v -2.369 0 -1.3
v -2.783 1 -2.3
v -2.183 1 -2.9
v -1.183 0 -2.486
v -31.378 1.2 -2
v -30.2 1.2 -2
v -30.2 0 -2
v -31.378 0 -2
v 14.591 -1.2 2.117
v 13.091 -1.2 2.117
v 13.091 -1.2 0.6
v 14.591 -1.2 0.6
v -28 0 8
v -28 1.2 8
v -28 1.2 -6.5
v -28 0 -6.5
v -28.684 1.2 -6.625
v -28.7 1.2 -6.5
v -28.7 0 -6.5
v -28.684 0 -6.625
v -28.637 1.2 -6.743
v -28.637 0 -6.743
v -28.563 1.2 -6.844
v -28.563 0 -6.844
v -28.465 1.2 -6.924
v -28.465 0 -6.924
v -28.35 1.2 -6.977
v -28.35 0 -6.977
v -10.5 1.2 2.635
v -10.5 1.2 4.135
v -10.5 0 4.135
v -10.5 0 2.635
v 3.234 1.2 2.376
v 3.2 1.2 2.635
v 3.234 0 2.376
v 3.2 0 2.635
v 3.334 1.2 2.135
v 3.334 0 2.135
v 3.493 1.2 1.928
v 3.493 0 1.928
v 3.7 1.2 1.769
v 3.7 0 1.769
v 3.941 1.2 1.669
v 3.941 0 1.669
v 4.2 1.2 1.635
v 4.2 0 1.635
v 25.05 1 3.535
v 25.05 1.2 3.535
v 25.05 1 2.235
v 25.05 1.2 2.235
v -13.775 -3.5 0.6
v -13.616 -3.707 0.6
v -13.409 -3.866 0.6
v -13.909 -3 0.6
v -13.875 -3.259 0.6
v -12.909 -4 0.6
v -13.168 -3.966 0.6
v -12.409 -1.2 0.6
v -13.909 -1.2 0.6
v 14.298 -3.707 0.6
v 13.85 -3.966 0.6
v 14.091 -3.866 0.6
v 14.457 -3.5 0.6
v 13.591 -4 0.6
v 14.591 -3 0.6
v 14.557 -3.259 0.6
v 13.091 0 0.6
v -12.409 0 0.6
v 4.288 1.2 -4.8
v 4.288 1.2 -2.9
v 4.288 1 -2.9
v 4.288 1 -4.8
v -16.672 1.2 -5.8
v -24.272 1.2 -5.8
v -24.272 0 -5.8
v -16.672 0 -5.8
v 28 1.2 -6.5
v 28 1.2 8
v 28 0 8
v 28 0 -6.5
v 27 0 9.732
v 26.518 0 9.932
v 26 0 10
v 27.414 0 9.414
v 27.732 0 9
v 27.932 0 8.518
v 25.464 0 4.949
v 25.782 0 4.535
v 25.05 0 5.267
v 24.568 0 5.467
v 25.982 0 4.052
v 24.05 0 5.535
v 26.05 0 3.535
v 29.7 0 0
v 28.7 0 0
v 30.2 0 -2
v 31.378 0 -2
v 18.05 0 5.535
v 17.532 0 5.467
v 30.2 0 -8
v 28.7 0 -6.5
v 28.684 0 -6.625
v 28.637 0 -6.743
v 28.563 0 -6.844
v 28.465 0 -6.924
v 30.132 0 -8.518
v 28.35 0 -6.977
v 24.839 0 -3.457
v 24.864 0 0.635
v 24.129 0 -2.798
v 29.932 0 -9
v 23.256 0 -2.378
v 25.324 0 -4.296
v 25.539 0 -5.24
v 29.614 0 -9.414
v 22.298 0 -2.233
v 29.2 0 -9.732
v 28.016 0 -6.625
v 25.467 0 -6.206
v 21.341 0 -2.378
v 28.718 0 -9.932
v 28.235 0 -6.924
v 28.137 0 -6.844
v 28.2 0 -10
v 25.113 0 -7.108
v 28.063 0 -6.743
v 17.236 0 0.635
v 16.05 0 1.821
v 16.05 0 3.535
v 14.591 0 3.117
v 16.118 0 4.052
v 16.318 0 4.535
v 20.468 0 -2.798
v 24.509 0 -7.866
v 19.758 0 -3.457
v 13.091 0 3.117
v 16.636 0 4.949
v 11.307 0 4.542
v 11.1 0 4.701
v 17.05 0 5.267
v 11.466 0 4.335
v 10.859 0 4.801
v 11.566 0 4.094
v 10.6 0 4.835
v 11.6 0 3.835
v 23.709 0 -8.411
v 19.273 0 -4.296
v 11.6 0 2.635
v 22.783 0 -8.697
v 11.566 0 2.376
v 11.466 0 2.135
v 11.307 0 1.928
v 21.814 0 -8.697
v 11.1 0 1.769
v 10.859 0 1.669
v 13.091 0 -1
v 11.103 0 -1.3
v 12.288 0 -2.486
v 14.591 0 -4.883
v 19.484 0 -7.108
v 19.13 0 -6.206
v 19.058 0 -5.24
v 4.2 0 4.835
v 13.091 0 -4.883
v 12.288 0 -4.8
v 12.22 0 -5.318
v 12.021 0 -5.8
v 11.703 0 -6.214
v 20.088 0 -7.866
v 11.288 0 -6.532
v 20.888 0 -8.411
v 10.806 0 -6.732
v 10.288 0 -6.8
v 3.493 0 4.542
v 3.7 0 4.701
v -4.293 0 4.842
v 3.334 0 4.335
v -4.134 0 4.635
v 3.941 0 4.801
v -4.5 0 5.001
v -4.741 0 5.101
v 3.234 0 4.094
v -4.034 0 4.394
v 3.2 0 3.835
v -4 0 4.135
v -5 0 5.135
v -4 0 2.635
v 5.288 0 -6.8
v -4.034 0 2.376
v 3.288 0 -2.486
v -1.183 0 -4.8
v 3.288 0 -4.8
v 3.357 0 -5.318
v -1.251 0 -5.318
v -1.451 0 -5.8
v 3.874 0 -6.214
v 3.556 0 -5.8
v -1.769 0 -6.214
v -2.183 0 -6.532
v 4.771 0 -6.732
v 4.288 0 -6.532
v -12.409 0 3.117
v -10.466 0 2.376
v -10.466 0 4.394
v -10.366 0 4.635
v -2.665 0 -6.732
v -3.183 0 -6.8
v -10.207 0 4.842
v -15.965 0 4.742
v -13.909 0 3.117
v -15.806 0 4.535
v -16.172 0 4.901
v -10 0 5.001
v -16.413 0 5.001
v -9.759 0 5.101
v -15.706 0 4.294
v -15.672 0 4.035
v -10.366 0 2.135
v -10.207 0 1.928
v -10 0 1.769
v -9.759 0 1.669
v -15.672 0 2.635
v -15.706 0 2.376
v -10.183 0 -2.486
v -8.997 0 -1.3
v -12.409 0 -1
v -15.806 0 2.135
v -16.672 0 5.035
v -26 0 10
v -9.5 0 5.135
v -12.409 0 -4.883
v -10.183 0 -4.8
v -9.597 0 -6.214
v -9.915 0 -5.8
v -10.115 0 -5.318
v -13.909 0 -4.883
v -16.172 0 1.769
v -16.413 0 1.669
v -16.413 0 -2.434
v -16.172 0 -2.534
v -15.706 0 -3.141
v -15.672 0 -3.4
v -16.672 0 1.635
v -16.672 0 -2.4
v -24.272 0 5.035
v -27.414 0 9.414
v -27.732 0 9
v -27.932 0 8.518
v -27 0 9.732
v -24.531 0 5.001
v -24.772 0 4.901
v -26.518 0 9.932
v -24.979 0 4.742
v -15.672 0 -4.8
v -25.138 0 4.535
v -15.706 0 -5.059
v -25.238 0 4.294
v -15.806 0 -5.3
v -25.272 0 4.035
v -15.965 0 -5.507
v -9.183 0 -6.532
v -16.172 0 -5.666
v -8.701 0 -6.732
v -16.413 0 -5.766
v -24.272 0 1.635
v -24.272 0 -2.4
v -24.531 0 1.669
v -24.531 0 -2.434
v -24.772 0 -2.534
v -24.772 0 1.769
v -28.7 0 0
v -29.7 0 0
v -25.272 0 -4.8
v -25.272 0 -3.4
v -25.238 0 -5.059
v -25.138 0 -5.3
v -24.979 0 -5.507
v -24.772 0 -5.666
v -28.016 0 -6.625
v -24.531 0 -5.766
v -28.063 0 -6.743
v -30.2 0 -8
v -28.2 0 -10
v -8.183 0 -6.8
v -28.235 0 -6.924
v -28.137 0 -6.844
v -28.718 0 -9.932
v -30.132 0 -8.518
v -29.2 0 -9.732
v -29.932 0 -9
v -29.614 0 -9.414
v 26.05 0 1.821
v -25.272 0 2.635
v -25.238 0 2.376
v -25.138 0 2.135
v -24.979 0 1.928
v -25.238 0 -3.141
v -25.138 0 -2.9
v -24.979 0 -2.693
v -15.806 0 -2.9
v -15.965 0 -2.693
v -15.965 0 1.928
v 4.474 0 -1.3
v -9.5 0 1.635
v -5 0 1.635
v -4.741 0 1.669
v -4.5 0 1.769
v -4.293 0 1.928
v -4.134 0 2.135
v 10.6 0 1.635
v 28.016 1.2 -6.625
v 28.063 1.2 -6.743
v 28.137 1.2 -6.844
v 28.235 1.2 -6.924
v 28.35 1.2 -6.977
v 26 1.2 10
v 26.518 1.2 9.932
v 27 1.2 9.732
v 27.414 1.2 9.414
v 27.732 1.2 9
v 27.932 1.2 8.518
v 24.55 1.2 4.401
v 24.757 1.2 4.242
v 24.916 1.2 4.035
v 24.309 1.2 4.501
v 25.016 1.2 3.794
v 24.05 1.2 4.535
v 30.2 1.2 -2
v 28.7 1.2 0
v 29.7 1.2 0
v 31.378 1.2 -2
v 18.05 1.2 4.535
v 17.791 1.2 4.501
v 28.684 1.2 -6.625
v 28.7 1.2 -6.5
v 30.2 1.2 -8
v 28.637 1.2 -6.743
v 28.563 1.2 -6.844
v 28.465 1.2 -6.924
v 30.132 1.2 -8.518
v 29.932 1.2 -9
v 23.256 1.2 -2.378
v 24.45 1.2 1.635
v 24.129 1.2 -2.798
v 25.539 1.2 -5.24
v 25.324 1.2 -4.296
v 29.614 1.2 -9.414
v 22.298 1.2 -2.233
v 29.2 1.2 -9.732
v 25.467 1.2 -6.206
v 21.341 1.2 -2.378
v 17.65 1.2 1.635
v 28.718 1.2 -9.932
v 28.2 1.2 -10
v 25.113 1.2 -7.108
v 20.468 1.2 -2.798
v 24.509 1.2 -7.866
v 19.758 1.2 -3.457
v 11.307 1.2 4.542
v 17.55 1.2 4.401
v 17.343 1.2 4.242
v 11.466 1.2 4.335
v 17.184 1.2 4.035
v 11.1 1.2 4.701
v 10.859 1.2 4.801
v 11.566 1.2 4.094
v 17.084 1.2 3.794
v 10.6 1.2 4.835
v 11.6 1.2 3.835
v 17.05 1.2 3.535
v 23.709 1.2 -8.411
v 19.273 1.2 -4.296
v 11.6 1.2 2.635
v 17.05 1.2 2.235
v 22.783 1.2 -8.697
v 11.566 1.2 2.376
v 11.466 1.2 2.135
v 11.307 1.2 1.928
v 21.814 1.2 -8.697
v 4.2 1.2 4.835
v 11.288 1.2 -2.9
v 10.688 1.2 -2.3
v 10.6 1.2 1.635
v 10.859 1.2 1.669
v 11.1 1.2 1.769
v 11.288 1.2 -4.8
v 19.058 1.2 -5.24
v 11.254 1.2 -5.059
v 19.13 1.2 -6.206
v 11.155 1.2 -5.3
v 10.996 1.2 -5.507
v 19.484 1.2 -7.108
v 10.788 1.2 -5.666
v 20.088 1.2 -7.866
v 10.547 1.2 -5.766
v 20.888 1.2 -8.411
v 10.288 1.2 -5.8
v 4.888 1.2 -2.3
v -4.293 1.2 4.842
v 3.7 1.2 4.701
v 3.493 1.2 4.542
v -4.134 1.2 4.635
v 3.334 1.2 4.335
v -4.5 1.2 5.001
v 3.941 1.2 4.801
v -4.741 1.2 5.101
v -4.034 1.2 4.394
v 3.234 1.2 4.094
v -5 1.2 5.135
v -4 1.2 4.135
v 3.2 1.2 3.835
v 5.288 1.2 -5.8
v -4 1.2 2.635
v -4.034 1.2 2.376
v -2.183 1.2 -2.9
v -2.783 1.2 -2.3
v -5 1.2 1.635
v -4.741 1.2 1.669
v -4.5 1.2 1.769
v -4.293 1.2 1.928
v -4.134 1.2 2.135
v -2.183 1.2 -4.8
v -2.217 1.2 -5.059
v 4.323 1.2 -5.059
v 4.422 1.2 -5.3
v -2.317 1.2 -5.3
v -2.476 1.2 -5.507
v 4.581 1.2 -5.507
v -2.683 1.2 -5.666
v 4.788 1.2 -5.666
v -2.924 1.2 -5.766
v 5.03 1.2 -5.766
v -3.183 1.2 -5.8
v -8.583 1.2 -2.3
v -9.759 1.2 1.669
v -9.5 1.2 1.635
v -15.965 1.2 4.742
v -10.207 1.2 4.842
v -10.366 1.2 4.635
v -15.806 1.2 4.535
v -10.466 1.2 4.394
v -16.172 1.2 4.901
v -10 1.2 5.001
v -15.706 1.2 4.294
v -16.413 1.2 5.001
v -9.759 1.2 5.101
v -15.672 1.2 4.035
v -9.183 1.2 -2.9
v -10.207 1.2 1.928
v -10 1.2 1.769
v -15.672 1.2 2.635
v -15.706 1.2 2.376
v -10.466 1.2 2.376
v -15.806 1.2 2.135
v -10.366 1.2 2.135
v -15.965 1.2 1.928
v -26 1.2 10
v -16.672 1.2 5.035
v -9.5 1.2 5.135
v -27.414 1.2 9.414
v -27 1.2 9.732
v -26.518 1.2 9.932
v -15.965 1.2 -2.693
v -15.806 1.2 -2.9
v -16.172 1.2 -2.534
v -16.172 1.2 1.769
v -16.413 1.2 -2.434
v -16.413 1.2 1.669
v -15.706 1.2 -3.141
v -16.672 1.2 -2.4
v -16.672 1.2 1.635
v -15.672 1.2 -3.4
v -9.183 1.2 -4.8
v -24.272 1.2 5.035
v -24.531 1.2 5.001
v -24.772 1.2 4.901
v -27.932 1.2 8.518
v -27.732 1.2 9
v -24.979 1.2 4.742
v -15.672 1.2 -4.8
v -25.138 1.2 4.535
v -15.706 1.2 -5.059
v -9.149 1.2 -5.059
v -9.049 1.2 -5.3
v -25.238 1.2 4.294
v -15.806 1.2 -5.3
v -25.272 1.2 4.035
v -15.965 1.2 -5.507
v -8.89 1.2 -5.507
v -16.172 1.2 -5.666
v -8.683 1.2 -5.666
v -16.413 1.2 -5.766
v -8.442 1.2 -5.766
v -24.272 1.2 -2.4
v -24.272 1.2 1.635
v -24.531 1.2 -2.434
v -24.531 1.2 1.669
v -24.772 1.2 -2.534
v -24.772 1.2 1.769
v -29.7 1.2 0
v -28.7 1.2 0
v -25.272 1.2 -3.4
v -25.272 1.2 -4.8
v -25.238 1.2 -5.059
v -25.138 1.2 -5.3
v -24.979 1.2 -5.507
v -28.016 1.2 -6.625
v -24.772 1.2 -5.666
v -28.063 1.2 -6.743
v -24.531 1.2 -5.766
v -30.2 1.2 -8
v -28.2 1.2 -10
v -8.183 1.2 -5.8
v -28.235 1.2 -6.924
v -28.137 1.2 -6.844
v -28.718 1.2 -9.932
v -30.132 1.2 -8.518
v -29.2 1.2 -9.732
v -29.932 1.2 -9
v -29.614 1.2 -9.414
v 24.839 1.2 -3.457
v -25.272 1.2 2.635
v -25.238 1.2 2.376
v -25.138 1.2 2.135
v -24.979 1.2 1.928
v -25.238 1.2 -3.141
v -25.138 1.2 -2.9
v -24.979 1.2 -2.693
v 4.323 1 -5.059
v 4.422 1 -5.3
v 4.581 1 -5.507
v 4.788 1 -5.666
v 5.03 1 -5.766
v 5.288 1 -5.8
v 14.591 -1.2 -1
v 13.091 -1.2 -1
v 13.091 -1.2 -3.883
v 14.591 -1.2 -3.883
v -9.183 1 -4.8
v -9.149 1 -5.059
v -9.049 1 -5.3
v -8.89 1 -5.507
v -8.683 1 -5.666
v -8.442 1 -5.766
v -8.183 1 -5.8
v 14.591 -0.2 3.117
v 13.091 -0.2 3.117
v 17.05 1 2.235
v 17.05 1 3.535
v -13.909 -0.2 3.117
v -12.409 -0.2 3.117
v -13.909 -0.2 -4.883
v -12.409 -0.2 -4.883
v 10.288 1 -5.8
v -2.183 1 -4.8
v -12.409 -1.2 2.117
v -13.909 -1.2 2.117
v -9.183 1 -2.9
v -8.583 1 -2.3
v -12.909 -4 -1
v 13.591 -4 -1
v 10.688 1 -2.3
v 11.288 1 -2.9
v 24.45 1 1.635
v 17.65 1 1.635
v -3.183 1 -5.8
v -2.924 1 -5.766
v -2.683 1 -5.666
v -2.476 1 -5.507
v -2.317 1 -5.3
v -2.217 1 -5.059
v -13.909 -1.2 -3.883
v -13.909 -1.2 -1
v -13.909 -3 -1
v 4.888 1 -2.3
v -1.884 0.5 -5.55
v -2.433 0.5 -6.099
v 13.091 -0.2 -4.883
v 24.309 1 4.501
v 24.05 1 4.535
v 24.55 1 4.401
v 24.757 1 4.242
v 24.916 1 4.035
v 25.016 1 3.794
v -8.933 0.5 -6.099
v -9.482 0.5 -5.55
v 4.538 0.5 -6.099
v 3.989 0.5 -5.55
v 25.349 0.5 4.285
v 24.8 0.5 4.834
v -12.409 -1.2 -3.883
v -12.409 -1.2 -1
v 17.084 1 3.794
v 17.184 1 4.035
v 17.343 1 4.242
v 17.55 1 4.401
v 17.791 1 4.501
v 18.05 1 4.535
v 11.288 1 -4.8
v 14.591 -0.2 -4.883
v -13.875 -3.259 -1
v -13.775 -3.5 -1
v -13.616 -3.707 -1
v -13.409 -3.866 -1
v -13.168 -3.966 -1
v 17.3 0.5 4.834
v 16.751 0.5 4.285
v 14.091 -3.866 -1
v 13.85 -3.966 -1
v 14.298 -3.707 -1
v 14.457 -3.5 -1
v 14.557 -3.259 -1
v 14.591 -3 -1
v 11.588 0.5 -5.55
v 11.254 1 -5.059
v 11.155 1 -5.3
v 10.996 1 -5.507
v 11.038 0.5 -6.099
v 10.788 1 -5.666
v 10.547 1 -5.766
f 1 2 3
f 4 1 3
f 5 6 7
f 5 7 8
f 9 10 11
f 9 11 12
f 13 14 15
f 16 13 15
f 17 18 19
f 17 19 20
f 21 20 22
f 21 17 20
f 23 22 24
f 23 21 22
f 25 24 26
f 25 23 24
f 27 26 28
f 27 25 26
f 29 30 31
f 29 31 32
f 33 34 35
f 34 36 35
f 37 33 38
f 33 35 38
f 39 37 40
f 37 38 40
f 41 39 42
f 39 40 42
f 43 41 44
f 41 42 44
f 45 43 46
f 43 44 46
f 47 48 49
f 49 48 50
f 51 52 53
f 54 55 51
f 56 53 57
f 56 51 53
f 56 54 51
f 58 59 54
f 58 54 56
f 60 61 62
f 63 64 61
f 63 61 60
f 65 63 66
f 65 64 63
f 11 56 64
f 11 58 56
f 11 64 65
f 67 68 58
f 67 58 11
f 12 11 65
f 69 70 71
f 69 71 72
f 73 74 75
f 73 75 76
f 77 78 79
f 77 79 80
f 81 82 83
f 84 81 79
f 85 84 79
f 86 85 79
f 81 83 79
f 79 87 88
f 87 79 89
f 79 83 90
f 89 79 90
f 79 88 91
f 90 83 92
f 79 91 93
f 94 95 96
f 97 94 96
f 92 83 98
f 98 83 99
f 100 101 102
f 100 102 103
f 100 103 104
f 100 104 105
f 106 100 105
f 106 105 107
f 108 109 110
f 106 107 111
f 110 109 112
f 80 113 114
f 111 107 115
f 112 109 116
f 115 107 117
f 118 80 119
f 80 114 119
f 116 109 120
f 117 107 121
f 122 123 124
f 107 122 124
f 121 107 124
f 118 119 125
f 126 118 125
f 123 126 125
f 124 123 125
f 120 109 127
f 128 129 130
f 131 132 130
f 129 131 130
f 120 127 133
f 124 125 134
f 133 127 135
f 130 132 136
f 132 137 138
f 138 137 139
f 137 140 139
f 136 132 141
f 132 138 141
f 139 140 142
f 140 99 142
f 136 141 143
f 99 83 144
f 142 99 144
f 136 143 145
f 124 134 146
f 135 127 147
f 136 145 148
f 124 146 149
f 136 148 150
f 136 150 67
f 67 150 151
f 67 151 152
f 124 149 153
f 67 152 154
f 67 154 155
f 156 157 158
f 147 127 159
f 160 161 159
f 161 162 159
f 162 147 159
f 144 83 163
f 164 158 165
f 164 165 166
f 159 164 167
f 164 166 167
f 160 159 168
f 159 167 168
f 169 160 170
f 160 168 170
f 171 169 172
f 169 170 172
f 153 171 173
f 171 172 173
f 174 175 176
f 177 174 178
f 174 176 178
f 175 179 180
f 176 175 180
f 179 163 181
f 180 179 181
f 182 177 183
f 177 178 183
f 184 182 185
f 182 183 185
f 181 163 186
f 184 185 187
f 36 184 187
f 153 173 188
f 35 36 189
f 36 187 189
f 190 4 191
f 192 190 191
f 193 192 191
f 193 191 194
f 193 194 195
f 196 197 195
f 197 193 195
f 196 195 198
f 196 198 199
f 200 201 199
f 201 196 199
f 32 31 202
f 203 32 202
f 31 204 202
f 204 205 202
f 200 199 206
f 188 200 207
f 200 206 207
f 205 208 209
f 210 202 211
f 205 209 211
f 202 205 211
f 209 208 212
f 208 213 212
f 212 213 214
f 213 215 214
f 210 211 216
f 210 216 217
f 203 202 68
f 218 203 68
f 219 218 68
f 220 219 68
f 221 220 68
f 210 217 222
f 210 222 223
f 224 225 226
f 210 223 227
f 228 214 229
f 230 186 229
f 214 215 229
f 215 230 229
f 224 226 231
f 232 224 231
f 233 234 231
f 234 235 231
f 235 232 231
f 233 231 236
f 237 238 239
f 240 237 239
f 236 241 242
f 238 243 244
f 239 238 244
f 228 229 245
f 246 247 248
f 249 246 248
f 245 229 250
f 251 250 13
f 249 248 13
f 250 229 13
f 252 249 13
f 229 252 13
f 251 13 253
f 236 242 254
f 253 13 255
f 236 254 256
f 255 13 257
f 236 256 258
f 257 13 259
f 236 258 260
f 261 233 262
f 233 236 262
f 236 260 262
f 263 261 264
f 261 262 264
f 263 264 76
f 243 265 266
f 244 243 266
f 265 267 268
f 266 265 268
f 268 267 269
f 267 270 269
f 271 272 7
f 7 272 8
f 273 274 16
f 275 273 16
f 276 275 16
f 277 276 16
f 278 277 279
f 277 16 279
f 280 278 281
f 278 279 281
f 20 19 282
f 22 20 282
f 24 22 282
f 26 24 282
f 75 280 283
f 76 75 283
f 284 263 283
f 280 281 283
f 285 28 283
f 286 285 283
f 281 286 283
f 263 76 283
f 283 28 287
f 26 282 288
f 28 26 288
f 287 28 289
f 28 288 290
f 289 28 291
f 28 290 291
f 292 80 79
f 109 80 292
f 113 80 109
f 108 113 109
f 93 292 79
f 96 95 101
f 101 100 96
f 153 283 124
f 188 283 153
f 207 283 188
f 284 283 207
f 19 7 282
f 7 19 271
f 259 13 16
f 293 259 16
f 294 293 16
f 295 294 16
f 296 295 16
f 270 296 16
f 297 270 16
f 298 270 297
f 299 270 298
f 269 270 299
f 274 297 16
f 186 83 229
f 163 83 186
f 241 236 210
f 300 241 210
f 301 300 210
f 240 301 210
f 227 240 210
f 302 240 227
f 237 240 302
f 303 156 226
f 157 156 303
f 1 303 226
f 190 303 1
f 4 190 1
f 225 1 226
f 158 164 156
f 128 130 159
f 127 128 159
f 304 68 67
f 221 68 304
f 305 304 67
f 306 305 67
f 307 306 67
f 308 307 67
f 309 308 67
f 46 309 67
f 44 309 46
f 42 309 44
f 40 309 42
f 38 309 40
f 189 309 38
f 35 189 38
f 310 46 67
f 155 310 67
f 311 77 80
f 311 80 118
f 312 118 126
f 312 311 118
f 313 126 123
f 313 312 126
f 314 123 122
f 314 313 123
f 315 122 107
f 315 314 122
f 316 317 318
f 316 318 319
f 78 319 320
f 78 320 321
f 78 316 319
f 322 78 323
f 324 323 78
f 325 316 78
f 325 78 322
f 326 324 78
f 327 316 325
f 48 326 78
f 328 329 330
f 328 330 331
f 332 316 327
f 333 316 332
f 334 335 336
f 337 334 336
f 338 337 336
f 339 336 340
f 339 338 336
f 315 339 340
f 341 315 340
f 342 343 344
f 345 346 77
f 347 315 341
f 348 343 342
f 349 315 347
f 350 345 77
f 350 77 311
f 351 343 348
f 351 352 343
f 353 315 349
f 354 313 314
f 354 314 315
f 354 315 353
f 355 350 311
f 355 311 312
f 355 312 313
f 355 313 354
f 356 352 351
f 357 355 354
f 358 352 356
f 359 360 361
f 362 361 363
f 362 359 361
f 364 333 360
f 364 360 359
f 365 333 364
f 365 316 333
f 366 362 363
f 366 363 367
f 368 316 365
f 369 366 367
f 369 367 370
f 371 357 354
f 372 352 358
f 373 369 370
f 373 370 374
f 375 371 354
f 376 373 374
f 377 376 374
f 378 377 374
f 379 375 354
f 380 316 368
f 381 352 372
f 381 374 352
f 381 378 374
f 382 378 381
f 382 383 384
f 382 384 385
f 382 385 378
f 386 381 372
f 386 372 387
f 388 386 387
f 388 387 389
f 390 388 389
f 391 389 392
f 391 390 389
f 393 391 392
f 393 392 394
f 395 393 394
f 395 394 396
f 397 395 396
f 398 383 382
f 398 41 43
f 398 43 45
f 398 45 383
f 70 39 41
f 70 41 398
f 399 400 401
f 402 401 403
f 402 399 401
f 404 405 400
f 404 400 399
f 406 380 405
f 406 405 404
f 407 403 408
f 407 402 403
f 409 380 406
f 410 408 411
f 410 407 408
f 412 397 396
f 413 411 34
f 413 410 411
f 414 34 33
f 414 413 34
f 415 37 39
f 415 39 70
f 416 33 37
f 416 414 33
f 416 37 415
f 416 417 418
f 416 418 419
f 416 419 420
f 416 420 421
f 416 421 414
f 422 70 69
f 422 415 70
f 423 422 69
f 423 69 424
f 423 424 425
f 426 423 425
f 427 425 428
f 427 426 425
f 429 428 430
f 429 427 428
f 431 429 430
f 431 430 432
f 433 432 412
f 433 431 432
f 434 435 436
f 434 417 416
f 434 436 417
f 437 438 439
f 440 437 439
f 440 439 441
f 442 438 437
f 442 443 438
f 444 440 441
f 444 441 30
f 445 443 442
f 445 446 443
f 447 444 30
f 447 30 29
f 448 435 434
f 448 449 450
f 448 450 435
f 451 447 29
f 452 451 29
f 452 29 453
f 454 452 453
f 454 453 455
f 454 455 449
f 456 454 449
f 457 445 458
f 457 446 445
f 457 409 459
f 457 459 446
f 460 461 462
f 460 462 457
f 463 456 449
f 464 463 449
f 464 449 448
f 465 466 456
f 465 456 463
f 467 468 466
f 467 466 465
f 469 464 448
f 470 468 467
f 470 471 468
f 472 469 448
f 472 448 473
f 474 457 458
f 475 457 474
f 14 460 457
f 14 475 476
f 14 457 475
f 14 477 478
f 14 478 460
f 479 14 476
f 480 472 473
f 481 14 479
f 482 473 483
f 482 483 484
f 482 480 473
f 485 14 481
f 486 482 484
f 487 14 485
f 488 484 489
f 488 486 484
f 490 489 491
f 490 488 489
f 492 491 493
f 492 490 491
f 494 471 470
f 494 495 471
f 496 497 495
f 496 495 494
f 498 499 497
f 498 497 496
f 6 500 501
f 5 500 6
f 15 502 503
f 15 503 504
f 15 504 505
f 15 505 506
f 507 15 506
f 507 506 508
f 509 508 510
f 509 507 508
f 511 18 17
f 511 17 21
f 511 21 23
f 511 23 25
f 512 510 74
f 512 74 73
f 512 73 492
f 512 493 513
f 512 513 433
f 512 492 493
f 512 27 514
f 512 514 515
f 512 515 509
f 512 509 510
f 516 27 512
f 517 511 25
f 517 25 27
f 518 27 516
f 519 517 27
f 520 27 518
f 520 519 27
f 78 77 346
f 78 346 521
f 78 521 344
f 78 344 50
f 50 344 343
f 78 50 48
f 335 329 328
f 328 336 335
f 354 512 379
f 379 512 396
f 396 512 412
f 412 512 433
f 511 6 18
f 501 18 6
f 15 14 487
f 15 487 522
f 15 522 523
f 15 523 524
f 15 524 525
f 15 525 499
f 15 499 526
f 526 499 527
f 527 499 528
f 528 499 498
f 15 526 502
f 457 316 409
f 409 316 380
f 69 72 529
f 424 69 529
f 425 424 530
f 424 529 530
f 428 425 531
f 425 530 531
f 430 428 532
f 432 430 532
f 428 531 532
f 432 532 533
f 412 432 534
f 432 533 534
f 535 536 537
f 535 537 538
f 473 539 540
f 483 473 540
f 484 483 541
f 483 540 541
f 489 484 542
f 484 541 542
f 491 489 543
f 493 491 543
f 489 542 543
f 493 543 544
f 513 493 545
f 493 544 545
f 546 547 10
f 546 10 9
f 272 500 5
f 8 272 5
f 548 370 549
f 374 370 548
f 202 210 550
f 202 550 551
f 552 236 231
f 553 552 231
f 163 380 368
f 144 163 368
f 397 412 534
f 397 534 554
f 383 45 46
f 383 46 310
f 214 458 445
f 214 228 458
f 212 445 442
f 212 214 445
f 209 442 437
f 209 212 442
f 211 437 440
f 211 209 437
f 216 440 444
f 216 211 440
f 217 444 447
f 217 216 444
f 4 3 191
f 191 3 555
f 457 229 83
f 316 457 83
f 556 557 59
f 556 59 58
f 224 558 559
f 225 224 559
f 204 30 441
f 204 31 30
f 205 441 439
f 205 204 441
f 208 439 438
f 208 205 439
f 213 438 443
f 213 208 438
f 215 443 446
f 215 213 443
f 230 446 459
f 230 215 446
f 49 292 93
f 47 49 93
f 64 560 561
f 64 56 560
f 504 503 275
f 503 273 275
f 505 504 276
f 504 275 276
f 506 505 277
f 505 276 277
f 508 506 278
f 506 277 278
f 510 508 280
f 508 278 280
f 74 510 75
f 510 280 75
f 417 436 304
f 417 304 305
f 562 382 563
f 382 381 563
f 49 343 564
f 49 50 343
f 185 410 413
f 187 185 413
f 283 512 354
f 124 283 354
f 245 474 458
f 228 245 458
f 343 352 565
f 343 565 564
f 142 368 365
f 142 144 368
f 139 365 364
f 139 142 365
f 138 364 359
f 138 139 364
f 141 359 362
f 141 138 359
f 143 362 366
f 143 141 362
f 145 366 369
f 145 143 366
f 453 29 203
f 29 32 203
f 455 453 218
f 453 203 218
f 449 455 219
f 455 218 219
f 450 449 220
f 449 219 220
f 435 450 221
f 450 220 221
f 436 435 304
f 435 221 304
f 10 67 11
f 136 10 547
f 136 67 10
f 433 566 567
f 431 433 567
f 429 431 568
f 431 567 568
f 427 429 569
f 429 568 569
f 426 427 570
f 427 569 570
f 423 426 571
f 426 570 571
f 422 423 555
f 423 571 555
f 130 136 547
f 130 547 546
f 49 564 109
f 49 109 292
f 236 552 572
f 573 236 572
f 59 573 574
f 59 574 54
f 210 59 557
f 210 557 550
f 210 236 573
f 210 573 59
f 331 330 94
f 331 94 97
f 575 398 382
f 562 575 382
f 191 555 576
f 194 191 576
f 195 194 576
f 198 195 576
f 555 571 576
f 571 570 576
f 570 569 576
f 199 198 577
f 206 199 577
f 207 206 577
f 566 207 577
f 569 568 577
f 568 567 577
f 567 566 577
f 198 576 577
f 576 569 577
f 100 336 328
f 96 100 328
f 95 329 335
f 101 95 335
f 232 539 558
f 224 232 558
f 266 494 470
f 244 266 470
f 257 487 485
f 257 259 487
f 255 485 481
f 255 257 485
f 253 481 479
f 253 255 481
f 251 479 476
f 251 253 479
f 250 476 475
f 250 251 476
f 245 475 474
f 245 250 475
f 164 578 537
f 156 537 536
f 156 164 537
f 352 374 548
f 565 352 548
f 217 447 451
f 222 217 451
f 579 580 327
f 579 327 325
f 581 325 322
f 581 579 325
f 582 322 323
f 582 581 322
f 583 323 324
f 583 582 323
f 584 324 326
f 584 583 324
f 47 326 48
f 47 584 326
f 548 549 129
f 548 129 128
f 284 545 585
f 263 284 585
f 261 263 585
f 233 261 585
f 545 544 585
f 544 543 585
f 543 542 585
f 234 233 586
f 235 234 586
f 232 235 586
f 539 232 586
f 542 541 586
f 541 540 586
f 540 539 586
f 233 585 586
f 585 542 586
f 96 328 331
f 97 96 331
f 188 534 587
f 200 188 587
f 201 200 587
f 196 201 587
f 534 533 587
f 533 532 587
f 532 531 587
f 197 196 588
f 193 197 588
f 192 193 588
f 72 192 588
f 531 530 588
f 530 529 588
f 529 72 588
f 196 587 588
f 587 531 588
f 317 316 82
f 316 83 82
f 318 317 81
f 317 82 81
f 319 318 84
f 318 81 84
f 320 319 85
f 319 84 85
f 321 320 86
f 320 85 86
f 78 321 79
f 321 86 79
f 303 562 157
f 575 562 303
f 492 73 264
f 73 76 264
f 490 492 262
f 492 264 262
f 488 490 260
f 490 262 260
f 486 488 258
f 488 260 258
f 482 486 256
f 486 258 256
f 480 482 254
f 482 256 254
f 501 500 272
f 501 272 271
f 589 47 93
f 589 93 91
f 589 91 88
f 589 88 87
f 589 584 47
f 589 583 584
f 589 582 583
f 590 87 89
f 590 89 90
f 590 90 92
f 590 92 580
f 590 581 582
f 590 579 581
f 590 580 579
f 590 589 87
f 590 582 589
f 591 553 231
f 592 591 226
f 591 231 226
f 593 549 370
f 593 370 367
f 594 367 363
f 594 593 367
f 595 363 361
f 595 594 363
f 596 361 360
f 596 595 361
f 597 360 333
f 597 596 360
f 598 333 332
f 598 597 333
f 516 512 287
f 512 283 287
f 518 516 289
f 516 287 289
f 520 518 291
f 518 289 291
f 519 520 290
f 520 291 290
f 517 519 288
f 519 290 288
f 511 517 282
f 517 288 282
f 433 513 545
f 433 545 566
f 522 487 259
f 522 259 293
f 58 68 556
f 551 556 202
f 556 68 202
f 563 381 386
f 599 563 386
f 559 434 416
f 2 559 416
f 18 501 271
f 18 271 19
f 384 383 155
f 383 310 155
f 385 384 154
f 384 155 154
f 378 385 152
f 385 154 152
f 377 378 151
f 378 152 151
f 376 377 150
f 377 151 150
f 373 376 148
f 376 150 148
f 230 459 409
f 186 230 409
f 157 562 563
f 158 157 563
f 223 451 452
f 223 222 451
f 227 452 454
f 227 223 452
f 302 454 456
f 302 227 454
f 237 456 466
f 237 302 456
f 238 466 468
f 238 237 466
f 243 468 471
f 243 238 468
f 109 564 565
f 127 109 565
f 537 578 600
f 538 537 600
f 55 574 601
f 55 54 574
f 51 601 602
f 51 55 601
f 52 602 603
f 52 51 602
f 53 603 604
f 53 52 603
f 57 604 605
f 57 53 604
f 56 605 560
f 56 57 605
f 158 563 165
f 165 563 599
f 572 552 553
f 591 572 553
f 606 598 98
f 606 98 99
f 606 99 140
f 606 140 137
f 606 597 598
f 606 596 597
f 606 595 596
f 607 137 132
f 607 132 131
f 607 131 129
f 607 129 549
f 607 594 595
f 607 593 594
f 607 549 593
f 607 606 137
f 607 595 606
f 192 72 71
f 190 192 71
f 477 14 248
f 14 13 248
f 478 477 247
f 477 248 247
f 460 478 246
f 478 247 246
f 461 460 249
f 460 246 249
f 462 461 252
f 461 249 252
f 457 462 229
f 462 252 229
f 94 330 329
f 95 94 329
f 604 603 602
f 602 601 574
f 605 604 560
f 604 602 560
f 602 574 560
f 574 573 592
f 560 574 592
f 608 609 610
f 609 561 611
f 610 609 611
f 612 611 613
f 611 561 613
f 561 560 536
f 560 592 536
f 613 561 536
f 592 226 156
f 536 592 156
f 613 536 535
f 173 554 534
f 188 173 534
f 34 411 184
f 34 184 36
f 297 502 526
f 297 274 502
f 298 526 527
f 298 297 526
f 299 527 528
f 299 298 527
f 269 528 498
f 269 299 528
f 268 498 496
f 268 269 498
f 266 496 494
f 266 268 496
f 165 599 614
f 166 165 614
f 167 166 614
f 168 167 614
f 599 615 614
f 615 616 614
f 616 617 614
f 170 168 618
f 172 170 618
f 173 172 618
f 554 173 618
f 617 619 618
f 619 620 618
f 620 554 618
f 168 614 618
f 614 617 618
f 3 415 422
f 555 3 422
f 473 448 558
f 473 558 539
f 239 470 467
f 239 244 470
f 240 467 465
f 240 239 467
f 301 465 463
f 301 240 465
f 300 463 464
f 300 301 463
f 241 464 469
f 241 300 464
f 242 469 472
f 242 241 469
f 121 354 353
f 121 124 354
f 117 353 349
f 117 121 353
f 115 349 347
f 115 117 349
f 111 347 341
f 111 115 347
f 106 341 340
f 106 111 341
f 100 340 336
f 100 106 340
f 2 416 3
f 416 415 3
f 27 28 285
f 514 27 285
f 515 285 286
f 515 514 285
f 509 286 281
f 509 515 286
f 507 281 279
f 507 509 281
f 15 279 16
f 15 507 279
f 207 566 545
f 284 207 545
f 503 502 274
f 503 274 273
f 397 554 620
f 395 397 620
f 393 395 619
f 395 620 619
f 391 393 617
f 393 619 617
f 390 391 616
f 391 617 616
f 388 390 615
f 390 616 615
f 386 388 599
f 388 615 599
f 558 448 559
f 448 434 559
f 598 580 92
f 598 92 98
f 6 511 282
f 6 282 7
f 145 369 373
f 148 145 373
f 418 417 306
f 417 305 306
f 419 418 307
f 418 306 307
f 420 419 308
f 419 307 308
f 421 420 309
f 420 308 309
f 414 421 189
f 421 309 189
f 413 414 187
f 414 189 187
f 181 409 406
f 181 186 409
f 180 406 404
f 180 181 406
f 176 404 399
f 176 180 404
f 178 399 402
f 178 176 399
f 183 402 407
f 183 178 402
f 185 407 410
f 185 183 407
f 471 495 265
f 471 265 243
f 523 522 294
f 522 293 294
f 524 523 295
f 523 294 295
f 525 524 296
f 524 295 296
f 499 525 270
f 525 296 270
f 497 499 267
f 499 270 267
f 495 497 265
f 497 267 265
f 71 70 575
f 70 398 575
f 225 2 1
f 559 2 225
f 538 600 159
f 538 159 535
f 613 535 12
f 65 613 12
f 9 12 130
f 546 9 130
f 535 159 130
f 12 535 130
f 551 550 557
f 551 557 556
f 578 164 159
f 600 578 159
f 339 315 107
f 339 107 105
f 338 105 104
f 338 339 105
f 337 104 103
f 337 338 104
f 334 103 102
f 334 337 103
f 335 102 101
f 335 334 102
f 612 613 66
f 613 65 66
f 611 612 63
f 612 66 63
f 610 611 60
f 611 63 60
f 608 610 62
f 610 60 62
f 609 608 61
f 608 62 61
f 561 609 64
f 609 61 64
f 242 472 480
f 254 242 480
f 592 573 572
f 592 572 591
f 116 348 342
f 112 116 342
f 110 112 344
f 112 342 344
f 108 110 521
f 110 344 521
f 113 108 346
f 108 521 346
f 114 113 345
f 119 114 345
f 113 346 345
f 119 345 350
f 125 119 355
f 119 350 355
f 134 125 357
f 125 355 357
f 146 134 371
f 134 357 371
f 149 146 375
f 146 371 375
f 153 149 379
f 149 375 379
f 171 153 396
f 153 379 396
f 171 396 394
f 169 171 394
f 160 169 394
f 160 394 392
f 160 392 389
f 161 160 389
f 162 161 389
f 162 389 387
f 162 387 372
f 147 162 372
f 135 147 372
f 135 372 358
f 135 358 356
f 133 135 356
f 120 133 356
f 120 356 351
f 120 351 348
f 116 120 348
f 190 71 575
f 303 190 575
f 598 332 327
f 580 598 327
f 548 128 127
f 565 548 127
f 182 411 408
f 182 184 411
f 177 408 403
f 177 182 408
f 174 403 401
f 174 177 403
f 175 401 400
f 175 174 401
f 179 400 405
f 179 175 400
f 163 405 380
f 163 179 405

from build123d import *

# Parameters (mm, degrees)
SKETCH_1_W          = 60
SKETCH_1_H          = 20
EXTRUDE_1_DEPTH     = 1.2
CUT_EXTRUDE_1_REACH = 33.646
SKETCH_4_R          = 3.25
SKETCH_4_W          = 9.6
SKETCH_4_H          = 3.4
SKETCH_4_W_2        = 7
SKETCH_4_H_2        = 3.5
SKETCH_4_W_3        = 8
SKETCH_4_H_3        = 2.9
SKETCH_4_W_4        = 8.4
SKETCH_4_H_4        = 3.2
SKETCH_4_W_5        = 6.5
FILLET_2_R          = 1
CHAMFER_1_SIZE      = 0.6
SKETCH_5_W          = 1.5
SKETCH_5_H          = 8
EXTRUDE_2_DEPTH     = 1.2
SKETCH_6_W          = 28.5
SKETCH_6_H          = 1.6
EXTRUDE_3_DEPTH     = 4
FILLET_3_R          = 1
CHAMFER_2_SIZE      = 1
CHAMFER_4_SIZE      = 1
SKETCH_7_W          = 2
SKETCH_7_H          = 20
CUT_EXTRUDE_2_DEPTH = 5
EXTRUDE_5_DEPTH     = 1.2
FILLET_5_R          = 2
FILLET_6_R          = 0.5
CHAMFER_5_SIZE      = 2
CHAMFER_5_SIZE_2    = 2.383507185
CHAMFER_6_SIZE      = 2
CHAMFER_6_SIZE_2    = 2.383507185


with BuildPart() as part:
    # 草图1 → 凸台-拉伸1 (new body)
    with BuildSketch(Plane(origin=(0, 0, 0), x_dir=(1, 0, 0), z_dir=(0, 1, 0))):
        Rectangle(SKETCH_1_W, SKETCH_1_H)
    extrude(amount=EXTRUDE_1_DEPTH)

    # 草图4 → 切除-拉伸1 (cut, up to next)
    with BuildSketch(Plane(origin=(0, 1.2, 0), x_dir=(1, 0, 0), z_dir=(0, 1, 0)), mode=Mode.PRIVATE) as cut_extrude_1_sk1:
        with Locations(Location((22.298485985, 5.48318929, 0), (0, 0, 270))):
            Circle(SKETCH_4_R)
    cut_extrude_1_tool1 = extrude(cut_extrude_1_sk1.sketch, amount=-CUT_EXTRUDE_1_REACH, mode=Mode.PRIVATE) & part.part
    # 草图4 → 切除-拉伸1 (cut, up to next)
    with BuildSketch(Plane(origin=(0, 1.2, 0), x_dir=(1, 0, 0), z_dir=(0, 1, 0)), mode=Mode.PRIVATE) as cut_extrude_1_sk2:
        with Locations((-20.471722325, 4.1)):
            Rectangle(SKETCH_4_W, SKETCH_4_H)
    cut_extrude_1_tool2 = extrude(cut_extrude_1_sk2.sketch, amount=-CUT_EXTRUDE_1_REACH, mode=Mode.PRIVATE) & part.part
    # 草图4 → 切除-拉伸1 (cut, up to next)
    with BuildSketch(Plane(origin=(0, 1.2, 0), x_dir=(1, 0, 0), z_dir=(0, 1, 0)), mode=Mode.PRIVATE) as cut_extrude_1_sk3:
        with Locations((-5.682926277, 4.05)):
            Rectangle(SKETCH_4_W_2, SKETCH_4_H_2)
    cut_extrude_1_tool3 = extrude(cut_extrude_1_sk3.sketch, amount=-CUT_EXTRUDE_1_REACH, mode=Mode.PRIVATE) & part.part
    # 草图4 → 切除-拉伸1 (cut, up to next)
    with BuildSketch(Plane(origin=(0, 1.2, 0), x_dir=(1, 0, 0), z_dir=(0, 1, 0)), mode=Mode.PRIVATE) as cut_extrude_1_sk4:
        with Locations((7.788485985, 4.05)):
            Rectangle(SKETCH_4_W_2, SKETCH_4_H_2)
    cut_extrude_1_tool4 = extrude(cut_extrude_1_sk4.sketch, amount=-CUT_EXTRUDE_1_REACH, mode=Mode.PRIVATE) & part.part
    # 草图4 → 切除-拉伸1 (cut, up to next)
    with BuildSketch(Plane(origin=(0, 1.2, 0), x_dir=(1, 0, 0), z_dir=(0, 1, 0)), mode=Mode.PRIVATE) as cut_extrude_1_sk5:
        with Locations((21.05, -3.084803861)):
            Rectangle(SKETCH_4_W_3, SKETCH_4_H_3)
    cut_extrude_1_tool5 = extrude(cut_extrude_1_sk5.sketch, amount=-CUT_EXTRUDE_1_REACH, mode=Mode.PRIVATE) & part.part
    # 草图4 → 切除-拉伸1 (cut, up to next)
    with BuildSketch(Plane(origin=(0, 1.2, 0), x_dir=(1, 0, 0), z_dir=(0, 1, 0)), mode=Mode.PRIVATE) as cut_extrude_1_sk6:
        with Locations((7.4, -3.234803861)):
            Rectangle(SKETCH_4_W_4, SKETCH_4_H_4)
    cut_extrude_1_tool6 = extrude(cut_extrude_1_sk6.sketch, amount=-CUT_EXTRUDE_1_REACH, mode=Mode.PRIVATE) & part.part
    # 草图4 → 切除-拉伸1 (cut, up to next)
    with BuildSketch(Plane(origin=(0, 1.2, 0), x_dir=(1, 0, 0), z_dir=(0, 1, 0)), mode=Mode.PRIVATE) as cut_extrude_1_sk7:
        with Locations((-7.25, -3.384803861)):
            Rectangle(SKETCH_4_W_5, SKETCH_4_H_2)
    cut_extrude_1_tool7 = extrude(cut_extrude_1_sk7.sketch, amount=-CUT_EXTRUDE_1_REACH, mode=Mode.PRIVATE) & part.part
    # 草图4 → 切除-拉伸1 (cut, up to next)
    with BuildSketch(Plane(origin=(0, 1.2, 0), x_dir=(1, 0, 0), z_dir=(0, 1, 0)), mode=Mode.PRIVATE) as cut_extrude_1_sk8:
        with Locations((-20.471722325, -3.334803861)):
            Rectangle(SKETCH_4_W, SKETCH_4_H)
    cut_extrude_1_tool8 = extrude(cut_extrude_1_sk8.sketch, amount=-CUT_EXTRUDE_1_REACH, mode=Mode.PRIVATE) & part.part
    add(cut_extrude_1_tool1.solids().sort_by_distance((22.298486, 1.2, -5.483189))[0], mode=Mode.SUBTRACT)
    add(cut_extrude_1_tool2.solids().sort_by_distance((-20.471722, 1.2, -4.1))[0], mode=Mode.SUBTRACT)
    add(cut_extrude_1_tool3.solids().sort_by_distance((-5.682926, 1.2, -4.05))[0], mode=Mode.SUBTRACT)
    add(cut_extrude_1_tool4.solids().sort_by_distance((7.788486, 1.2, -4.05))[0], mode=Mode.SUBTRACT)
    add(cut_extrude_1_tool5.solids().sort_by_distance((21.05, 1.2, 3.084804))[0], mode=Mode.SUBTRACT)
    add(cut_extrude_1_tool6.solids().sort_by_distance((7.4, 1.2, 3.234804))[0], mode=Mode.SUBTRACT)
    add(cut_extrude_1_tool7.solids().sort_by_distance((-7.25, 1.2, 3.384804))[0], mode=Mode.SUBTRACT)
    add(cut_extrude_1_tool8.solids().sort_by_distance((-20.471722, 1.2, 3.334804))[0], mode=Mode.SUBTRACT)

    # 圆角2
    fillet_2_edges = [part.edges().sort_by_distance(p)[0] for p in [
        (-9.182926277, 0.6, -5.8),
        (-2.182926277, 0.6, -5.8),
        (4.288485985, 0.6, -5.8),
        (11.288485985, 0.6, -5.8),
        (17.05, 0.6, 4.534803861),
        (25.05, 0.6, 4.534803861),
        (3.2, 0.6, 4.834803861),
        (3.2, 0.6, 1.634803861),
        (11.6, 0.6, 1.634803861),
        (11.6, 0.6, 4.834803861),
        (-10.5, 0.6, 5.134803861),
        (-10.5, 0.6, 1.634803861),
        (-4, 0.6, 1.634803861),
        (-4, 0.6, 5.134803861),
        (-25.271722325, 0.6, 5.034803861),
        (-25.271722325, 0.6, 1.634803861),
        (-15.671722325, 0.6, 1.634803861),
        (-15.671722325, 0.6, 5.034803861),
        (-25.271722325, 0.6, -2.4),
        (-25.271722325, 0.6, -5.8),
        (-15.671722325, 0.6, -5.8),
        (-15.671722325, 0.6, -2.4),
    ]]
    fillet(fillet_2_edges, radius=FILLET_2_R)

    # 倒角1
    chamfer_1_edges = [part.edges().sort_by_distance(p)[0] for p in [
        (-9.182926277, 0.6, -2.3),
        (-2.182926277, 0.6, -2.3),
        (4.288485985, 0.6, -2.3),
        (11.288485985, 0.6, -2.3),
        (17.05, 0.6, 1.634803861),
        (25.05, 0.6, 1.634803861),
    ]]
    chamfer(chamfer_1_edges, length=CHAMFER_1_SIZE)

    # 草图5 → 凸台-拉伸2 (add)
    with BuildSketch(Plane.XZ):
        with Locations((-13.15891381, -0.88318929)):
            Rectangle(SKETCH_5_W, SKETCH_5_H)
        with Locations((13.84108619, -0.88318929)):
            Rectangle(SKETCH_5_W, SKETCH_5_H)
    extrude(amount=EXTRUDE_2_DEPTH)

    # 草图6 → 凸台-拉伸3 (add)
    with BuildSketch(Plane.XZ):
        with Locations((0.34108619, -0.2)):
            Rectangle(SKETCH_6_W, SKETCH_6_H)
    extrude(amount=EXTRUDE_3_DEPTH)

    # 圆角3
    fillet_3_edges = [part.edges().sort_by_distance(p)[0] for p in [
        (-13.90891381, -4, -0.2),
        (14.59108619, -4, -0.2),
    ]]
    fillet(fillet_3_edges, radius=FILLET_3_R)

    # 倒角2
    chamfer_2_edges = [part.edges().sort_by_distance(p)[0] for p in [
        (-13.15891381, -1.2, -4.88318929),
        (-13.15891381, -1.2, 3.11681071),
        (13.84108619, -1.2, -4.88318929),
        (13.84108619, -1.2, 3.11681071),
    ]]
    chamfer(chamfer_2_edges, length=CHAMFER_2_SIZE)

    # 倒角4
    chamfer_4_edges = [part.edges().sort_by_distance(p)[0] for p in [
        (-5.682926277, 0, -5.8),
        (-2.182926277, 0, -3.85),
        (7.788485985, 0, -5.8),
        (11.288485985, 0, -3.85),
        (21.05, 0, 4.534803861),
        (17.05, 0, 2.884803861),
        (-2.475819496, 0, -5.507106781),
        (-8.890033058, 0, -5.507106781),
        (4.581379204, 0, -5.507106781),
        (10.995592766, 0, -5.507106781),
        (24.757106781, 0, 4.241910642),
        (17.342893219, 0, 4.241910642),
        (-5.682926277, 0, -2.3),
        (-9.182926277, 0, -3.85),
        (7.788485985, 0, -2.3),
        (4.288485985, 0, -3.85),
        (21.05, 0, 1.634803861),
        (25.05, 0, 2.884803861),
        (-8.882926277, 0, -2.6),
        (-2.482926277, 0, -2.6),
        (4.588485985, 0, -2.6),
        (10.988485985, 0, -2.6),
        (17.35, 0, 1.934803861),
        (24.75, 0, 1.934803861),
    ]]
    chamfer(chamfer_4_edges, length=CHAMFER_4_SIZE)

    # 草图7 → 切除-拉伸2 (cut)
    with BuildSketch(Plane(origin=(0, 1.2, 0), x_dir=(1, 0, 0), z_dir=(0, 1, 0))):
        with Locations((29, 0)):
            Rectangle(SKETCH_7_W, SKETCH_7_H)
        with Locations((-29, 0)):
            Rectangle(SKETCH_7_W, SKETCH_7_H)
    extrude(amount=-CUT_EXTRUDE_2_DEPTH, mode=Mode.SUBTRACT)

    # 草图11 → 凸台-拉伸5 (add)
    with BuildSketch(Plane(origin=(0, 1.2, 0), x_dir=(1, 0, 0), z_dir=(0, 1, 0))):
        Polygon((28, 10), (30.2, 10), (30.2, 2), (31.7, 2), (31.7, 0), (28.7, 0), (28.7, 7), (28, 7), align=None)
        Polygon((-28, 10), (-30.2, 10), (-30.2, 2), (-31.7, 2), (-31.7, 0), (-28.7, 0), (-28.7, 7), (-28, 7), align=None)
    extrude(amount=-EXTRUDE_5_DEPTH)

    # 圆角5
    fillet_5_edges = [part.edges().sort_by_distance(p)[0] for p in [
        (28, 0.6, 10),
        (-28, 0.6, 10),
        (30.2, 0.6, -10),
        (-30.2, 0.6, -10),
    ]]
    fillet(fillet_5_edges, radius=FILLET_5_R)

    # 圆角6
    # the kernel refuses this fillet: 0.5 mm, written as the material it adds along each edge
    with BuildSketch(Plane(origin=(28, 1.2, -7), x_dir=(0, 0, 1), z_dir=(0, -1, 0)), Plane(origin=(28.7, 1.2, -7), x_dir=(-1, 0, 0), z_dir=(0, -1, 0))) as fillet_6_piece_1:
        with BuildLine():
            CenterArc((FILLET_6_R, -FILLET_6_R), FILLET_6_R, 90, 90)
            Line((0, -FILLET_6_R), (0, 0))
            Line((0, 0), (FILLET_6_R, 0))
        make_face()
    extrude(amount=1.2)
    with BuildSketch(Plane(origin=(-28, 1.2, -7), x_dir=(0, 0, 1), z_dir=(0, -1, 0)), Plane(origin=(-28.7, 1.2, -7), x_dir=(1, 0, 0), z_dir=(0, -1, 0))) as fillet_6_piece_2:
        with BuildLine():
            CenterArc((FILLET_6_R, FILLET_6_R), FILLET_6_R, 180, 90)
            Line((0, FILLET_6_R), (0, 0))
            Line((0, 0), (FILLET_6_R, 0))
        make_face()
    extrude(amount=1.2)

    # 倒角5
    # the kernel refuses this chamfer: 2.383507185, 2 mm, written as the material it takes off along each edge
    with BuildSketch(Plane(origin=(31.7, 7.343265966, 0), x_dir=(-0.9993728857116148, 0, 0.03540953691366325), z_dir=(0, -1, 0))) as chamfer_5_piece_1:
        Polygon((CHAMFER_5_SIZE * 0.999372885712, CHAMFER_5_SIZE * 0.0354095369137), (-CHAMFER_5_SIZE_2 * 0.0354095369165, CHAMFER_5_SIZE_2 * 0.999372885791), (0, 0), align=None)
    extrude(amount=13.486531933, mode=Mode.SUBTRACT)

    # 倒角6
    # the kernel refuses this chamfer: 2.383507185, 2 mm, written as the material it takes off along each edge
    with BuildSketch(Plane(origin=(-31.7, 7.343265966, 0), x_dir=(0.9993728857116148, 0, 0.03540953691366311), z_dir=(0, -1, 0))) as chamfer_6_piece_1:
        Polygon((CHAMFER_6_SIZE * 0.999372885712, -CHAMFER_6_SIZE * 0.0354095369137), (-CHAMFER_6_SIZE_2 * 0.0354095369165, -CHAMFER_6_SIZE_2 * 0.999372885791), (0, 0), align=None)
    extrude(amount=13.486531933, mode=Mode.SUBTRACT)


solid = part.part
